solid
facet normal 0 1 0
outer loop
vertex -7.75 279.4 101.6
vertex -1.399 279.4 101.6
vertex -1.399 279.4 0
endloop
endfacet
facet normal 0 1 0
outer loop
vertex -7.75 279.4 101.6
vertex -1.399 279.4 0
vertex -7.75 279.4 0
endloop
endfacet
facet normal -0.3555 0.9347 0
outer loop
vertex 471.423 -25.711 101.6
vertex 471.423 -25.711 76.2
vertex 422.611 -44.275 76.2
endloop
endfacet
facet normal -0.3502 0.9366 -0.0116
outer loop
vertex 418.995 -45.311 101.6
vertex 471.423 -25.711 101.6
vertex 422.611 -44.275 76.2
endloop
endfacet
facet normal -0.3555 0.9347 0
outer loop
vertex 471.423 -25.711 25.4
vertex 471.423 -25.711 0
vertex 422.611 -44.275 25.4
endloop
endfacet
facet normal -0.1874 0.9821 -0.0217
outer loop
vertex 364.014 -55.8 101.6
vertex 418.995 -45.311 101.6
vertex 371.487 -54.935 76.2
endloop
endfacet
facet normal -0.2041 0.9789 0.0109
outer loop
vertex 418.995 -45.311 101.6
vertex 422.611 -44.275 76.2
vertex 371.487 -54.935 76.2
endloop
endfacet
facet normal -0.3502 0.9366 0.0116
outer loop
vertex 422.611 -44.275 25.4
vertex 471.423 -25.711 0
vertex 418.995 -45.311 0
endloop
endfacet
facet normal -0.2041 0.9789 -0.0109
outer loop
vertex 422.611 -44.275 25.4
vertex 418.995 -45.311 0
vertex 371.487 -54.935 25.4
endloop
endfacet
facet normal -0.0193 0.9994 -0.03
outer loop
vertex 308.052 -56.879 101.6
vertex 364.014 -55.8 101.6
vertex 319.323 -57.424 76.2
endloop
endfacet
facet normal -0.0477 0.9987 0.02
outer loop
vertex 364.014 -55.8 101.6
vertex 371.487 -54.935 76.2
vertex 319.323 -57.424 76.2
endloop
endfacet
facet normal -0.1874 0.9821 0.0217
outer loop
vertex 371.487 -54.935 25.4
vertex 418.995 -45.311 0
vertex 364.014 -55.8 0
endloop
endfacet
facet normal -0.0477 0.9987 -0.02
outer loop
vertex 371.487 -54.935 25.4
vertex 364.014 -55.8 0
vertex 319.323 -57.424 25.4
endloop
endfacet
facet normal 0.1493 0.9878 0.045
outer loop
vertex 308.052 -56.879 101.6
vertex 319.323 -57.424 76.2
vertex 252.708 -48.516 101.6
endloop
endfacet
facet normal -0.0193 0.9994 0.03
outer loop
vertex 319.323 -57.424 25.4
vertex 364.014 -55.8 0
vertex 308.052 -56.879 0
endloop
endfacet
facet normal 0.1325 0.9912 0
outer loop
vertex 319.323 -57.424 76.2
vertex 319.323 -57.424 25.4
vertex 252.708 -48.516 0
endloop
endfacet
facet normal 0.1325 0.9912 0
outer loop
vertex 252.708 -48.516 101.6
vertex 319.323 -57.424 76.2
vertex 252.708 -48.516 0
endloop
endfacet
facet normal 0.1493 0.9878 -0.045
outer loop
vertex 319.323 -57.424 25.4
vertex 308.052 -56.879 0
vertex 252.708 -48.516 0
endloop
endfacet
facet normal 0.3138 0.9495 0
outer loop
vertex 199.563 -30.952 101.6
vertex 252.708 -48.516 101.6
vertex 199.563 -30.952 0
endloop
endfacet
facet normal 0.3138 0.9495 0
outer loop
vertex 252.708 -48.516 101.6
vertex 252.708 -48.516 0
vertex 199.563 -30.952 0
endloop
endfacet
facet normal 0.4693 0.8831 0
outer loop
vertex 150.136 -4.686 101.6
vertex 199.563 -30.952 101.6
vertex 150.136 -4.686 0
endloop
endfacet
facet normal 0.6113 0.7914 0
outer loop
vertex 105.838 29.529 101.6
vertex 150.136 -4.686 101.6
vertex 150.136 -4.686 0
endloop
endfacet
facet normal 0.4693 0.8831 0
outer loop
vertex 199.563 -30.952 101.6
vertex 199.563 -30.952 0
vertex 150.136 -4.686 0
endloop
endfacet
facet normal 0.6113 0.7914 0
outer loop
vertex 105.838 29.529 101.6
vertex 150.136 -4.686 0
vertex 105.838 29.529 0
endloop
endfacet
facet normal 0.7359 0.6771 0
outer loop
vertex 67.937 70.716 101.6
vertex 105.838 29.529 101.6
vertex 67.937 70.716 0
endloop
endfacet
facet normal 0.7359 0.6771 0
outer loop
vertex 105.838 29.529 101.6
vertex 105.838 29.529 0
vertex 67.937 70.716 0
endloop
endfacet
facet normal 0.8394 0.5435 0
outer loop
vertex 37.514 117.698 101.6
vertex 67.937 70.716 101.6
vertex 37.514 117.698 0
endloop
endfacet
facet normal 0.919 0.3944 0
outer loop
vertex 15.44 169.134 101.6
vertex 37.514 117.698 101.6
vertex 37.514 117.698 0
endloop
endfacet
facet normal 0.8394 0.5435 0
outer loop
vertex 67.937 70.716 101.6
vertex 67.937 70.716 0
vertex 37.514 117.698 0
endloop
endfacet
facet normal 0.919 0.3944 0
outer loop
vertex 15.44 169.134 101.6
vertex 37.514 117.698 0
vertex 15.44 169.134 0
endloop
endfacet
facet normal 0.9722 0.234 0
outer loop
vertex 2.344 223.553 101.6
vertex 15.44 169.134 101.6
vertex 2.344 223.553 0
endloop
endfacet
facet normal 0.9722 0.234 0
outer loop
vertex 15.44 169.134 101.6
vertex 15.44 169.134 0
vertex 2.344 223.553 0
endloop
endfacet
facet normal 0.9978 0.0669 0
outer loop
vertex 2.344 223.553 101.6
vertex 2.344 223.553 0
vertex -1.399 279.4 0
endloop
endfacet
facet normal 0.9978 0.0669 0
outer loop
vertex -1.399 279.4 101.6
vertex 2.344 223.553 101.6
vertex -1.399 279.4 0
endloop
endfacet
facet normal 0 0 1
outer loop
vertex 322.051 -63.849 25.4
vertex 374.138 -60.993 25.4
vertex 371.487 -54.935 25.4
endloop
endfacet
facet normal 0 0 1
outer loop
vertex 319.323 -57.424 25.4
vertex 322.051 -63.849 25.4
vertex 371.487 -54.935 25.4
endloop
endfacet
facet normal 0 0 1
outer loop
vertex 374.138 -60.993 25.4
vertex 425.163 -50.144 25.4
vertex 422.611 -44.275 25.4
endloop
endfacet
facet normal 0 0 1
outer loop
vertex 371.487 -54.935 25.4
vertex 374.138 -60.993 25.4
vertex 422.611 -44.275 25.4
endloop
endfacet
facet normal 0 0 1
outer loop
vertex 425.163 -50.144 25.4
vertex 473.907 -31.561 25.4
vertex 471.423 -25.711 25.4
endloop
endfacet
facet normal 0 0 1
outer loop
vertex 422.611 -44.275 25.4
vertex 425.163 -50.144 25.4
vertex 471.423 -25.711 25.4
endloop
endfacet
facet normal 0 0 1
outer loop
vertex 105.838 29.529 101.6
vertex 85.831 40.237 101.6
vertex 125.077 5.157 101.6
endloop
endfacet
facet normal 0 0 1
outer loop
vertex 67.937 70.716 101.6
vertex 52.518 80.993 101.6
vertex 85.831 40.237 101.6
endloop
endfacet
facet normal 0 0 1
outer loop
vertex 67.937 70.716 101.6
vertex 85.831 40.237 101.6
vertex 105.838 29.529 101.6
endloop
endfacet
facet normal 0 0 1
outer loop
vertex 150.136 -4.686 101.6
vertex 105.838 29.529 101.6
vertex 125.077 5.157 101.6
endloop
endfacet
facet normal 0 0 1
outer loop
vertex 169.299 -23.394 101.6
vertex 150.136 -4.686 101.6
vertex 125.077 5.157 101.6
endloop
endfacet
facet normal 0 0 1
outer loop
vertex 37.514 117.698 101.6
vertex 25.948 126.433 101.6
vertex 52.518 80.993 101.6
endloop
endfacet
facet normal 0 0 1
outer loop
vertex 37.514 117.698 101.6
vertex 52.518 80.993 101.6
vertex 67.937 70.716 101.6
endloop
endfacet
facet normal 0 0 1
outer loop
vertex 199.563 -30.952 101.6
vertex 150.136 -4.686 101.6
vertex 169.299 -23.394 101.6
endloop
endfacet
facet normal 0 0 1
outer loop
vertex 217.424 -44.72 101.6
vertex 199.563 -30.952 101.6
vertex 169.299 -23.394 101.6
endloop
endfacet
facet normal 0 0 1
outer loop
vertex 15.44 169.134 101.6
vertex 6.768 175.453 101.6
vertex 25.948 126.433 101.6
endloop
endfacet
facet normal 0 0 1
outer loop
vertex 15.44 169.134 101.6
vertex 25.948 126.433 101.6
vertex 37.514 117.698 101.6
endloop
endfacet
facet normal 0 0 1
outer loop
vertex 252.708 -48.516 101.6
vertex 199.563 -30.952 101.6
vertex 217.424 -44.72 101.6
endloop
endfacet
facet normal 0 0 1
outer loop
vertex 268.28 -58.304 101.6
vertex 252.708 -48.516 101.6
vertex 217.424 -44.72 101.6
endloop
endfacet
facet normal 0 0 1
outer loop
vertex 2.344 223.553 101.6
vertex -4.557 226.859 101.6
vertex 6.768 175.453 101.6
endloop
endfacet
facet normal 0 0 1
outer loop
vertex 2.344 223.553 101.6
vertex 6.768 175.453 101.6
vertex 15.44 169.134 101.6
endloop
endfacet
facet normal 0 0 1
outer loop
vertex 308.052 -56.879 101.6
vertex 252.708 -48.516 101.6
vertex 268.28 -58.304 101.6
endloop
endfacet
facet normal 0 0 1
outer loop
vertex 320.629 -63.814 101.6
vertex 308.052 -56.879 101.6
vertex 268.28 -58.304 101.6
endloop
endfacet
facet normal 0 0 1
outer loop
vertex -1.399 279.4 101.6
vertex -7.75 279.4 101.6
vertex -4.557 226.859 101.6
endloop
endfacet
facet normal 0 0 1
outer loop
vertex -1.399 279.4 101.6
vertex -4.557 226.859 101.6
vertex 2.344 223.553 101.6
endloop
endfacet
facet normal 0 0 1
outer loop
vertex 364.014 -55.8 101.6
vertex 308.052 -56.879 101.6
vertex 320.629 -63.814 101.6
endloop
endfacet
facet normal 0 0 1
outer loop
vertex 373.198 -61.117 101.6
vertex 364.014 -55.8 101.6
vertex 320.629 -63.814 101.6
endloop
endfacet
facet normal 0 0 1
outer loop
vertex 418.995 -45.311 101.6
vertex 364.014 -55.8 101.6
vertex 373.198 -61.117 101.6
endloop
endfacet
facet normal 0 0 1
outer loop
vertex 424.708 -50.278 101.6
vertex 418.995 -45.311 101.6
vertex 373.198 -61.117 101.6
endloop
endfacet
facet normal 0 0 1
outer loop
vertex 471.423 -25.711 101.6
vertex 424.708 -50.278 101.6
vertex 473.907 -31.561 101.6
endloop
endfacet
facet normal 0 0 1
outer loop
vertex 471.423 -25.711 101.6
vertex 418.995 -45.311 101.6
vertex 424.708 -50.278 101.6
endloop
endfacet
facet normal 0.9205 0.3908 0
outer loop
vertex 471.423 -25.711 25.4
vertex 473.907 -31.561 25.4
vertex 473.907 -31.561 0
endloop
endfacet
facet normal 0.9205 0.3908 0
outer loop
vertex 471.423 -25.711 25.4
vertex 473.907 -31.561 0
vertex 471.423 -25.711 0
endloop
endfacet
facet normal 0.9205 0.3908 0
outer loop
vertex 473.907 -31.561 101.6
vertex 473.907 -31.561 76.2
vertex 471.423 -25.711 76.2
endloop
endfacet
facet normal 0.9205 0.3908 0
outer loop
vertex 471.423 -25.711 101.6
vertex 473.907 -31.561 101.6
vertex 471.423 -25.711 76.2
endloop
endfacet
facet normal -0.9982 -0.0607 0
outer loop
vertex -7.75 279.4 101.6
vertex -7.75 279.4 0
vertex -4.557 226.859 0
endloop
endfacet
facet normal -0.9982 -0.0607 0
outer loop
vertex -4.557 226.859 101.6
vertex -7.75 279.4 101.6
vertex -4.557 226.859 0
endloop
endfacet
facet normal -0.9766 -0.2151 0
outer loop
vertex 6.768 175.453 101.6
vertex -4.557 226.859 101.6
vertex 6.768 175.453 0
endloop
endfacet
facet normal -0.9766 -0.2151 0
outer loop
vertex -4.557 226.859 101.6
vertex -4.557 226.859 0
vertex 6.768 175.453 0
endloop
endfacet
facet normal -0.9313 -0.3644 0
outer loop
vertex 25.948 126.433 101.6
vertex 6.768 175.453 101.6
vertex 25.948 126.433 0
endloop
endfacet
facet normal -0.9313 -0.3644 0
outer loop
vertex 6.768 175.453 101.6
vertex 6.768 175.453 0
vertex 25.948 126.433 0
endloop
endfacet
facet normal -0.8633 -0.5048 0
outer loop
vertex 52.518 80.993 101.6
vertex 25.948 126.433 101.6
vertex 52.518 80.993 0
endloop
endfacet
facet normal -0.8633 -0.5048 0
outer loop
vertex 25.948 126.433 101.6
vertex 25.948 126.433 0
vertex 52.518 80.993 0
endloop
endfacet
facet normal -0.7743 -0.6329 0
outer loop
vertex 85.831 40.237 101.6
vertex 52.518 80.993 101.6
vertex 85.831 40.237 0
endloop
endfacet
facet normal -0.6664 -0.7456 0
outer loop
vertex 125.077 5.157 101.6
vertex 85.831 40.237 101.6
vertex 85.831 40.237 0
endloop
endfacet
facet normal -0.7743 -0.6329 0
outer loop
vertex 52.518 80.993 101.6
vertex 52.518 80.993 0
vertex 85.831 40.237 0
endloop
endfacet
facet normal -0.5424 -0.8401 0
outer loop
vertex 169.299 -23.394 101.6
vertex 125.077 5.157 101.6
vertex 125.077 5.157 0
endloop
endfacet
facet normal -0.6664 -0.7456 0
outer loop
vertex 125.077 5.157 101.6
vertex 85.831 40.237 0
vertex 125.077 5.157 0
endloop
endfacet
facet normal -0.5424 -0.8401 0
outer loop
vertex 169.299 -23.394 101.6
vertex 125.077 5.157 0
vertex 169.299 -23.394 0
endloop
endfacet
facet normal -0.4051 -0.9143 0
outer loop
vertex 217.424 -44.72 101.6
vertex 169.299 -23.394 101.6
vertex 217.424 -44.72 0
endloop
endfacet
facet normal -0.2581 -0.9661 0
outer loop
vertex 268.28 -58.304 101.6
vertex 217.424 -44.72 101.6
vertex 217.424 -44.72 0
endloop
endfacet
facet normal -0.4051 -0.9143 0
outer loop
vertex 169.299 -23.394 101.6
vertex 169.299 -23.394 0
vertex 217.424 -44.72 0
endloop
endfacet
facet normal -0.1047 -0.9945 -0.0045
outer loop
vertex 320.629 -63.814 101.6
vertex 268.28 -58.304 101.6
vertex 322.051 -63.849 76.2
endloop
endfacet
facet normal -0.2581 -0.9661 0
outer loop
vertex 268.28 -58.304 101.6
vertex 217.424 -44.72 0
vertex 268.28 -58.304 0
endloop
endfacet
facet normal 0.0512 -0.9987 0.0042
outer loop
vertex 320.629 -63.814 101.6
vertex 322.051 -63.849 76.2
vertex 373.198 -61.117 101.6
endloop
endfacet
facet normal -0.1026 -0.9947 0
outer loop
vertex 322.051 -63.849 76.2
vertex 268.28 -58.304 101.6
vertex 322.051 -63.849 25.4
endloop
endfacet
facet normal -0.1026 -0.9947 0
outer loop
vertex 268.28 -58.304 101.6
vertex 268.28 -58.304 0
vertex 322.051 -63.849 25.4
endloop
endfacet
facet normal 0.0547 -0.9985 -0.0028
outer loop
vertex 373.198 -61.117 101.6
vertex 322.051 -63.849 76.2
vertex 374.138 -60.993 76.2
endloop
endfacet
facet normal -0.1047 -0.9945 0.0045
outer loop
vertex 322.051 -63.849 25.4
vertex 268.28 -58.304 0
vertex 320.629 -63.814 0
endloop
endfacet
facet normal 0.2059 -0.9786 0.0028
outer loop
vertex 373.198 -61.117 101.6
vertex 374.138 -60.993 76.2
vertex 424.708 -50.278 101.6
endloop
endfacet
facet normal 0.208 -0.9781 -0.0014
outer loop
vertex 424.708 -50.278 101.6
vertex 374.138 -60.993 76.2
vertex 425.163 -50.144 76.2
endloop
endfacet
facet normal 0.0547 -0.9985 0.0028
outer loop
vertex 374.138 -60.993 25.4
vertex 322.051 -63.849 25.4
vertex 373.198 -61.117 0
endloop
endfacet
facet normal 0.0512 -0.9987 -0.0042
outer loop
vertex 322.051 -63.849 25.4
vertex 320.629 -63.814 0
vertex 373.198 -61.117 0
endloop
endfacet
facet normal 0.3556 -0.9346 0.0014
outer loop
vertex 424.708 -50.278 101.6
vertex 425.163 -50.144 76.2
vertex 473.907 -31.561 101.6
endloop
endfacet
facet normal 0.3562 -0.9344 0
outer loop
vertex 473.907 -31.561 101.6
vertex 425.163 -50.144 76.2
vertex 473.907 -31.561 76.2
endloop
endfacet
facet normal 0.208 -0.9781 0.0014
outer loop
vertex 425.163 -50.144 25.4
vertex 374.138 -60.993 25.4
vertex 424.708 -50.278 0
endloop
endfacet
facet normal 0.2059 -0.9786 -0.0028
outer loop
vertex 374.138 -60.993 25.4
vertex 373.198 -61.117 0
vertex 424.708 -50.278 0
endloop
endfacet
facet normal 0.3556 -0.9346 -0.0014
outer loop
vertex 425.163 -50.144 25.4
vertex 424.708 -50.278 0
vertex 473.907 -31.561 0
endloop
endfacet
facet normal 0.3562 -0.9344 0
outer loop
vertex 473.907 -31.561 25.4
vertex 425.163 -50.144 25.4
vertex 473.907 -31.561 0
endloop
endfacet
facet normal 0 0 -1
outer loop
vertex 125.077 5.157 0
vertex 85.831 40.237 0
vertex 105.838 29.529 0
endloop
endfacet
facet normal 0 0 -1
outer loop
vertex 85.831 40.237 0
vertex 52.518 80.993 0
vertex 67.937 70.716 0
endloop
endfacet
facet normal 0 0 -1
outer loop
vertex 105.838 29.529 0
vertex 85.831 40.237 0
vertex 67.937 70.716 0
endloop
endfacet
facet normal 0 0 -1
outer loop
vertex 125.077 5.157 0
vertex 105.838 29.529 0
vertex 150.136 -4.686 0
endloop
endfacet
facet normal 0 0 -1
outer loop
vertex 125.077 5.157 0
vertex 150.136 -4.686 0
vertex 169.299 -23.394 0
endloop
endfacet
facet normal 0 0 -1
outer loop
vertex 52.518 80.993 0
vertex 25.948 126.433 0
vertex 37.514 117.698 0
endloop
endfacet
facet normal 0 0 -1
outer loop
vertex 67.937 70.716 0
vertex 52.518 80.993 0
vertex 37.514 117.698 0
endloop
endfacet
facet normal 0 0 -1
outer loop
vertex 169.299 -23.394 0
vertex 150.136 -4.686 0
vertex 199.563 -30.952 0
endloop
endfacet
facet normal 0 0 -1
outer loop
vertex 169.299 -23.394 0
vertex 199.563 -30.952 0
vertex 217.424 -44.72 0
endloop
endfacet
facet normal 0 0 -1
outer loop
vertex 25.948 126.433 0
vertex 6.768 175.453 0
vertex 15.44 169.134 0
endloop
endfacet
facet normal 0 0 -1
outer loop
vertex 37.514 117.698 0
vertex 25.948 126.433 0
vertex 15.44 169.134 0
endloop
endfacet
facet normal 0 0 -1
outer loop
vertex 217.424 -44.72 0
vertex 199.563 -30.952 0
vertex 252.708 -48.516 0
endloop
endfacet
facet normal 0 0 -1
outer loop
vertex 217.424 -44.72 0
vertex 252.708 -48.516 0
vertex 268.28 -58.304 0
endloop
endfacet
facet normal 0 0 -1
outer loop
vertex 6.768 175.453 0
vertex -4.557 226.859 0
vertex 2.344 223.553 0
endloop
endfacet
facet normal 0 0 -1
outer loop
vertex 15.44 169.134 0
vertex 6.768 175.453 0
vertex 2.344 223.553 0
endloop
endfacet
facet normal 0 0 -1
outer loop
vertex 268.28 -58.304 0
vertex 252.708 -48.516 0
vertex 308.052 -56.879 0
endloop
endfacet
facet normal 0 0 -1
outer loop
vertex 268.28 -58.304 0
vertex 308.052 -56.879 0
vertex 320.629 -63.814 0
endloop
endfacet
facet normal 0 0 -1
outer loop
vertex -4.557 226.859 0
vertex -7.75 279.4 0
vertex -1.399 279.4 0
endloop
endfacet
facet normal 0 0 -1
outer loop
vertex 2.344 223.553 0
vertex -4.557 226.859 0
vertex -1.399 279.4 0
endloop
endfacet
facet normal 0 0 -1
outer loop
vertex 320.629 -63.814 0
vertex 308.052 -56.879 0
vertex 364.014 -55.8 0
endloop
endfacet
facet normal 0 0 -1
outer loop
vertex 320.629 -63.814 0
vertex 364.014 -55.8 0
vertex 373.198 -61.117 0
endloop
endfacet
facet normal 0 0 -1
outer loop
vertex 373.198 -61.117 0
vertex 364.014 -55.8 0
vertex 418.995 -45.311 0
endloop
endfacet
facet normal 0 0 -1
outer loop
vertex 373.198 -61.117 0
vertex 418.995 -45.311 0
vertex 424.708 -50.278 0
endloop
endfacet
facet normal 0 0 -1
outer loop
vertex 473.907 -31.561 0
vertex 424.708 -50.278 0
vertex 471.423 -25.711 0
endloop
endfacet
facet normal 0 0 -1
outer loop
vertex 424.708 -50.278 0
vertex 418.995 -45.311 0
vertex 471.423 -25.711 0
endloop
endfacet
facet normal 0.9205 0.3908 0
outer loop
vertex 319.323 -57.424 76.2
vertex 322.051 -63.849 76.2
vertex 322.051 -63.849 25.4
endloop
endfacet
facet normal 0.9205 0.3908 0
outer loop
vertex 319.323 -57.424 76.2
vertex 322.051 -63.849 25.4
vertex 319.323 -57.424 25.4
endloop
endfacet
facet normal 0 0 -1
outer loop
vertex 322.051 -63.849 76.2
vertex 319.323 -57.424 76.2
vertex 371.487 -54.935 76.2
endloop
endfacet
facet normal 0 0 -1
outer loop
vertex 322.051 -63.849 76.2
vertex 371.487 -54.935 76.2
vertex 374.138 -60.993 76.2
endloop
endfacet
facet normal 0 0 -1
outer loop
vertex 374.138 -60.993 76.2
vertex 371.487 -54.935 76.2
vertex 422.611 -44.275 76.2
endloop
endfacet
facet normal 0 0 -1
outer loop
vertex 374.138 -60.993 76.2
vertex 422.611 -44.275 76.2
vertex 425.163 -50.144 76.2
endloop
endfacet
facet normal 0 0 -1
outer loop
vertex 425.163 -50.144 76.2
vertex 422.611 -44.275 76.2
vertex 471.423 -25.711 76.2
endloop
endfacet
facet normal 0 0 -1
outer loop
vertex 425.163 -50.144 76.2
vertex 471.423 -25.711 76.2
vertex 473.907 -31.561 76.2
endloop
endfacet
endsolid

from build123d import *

# Parameters (mm, degrees)
F1_DEPTH = 101.6
F3_DEPTH = 152.4
F4_W     = 143.211212
F4_H     = 118.549919
F5_DEPTH = 25.4


with BuildPart() as f1:
    # F0 (on Top) → F1 (new body)
    with BuildSketch(Plane.XY):
        with BuildLine():
            ThreePointArc((471.423321, -25.710636), (139.580084, 2.415757), (0.027949, 304.8))
            Line((0.027949, 304.8), (-6.35, 304.8))
            ThreePointArc((-6.35, 304.8), (136.074708, -2.881746), (473.906585, -31.560616))
            Line((473.906585, -31.560616), (471.423321, -25.710636))
        make_face()
    extrude(amount=F1_DEPTH)

    # F2 (on face) → F3 (cut)
    with BuildSketch(Plane(origin=(390.198528, 165.635729, 0), x_dir=(-0.390744, 0.9205, 0), z_dir=(0.9205, 0.390744, 0))):
        Polygon((-139.049853, 76.2), (-316.849853, 76.2), (-316.849853, 25.4), (-214.227537, 25.4), (-139.049853, 25.4), align=None)
    extrude(amount=-F3_DEPTH, mode=Mode.SUBTRACT)

    # F4 (on face) → F5 (cut)
    with BuildSketch(Plane(origin=(0, 304.8, 0), x_dir=(-1, 0, 0), z_dir=(0, 1, 0))):
        with Locations((-15.944215, 54.147762)):
            Rectangle(F4_W, F4_H)
    extrude(amount=-F5_DEPTH, mode=Mode.SUBTRACT)


solid = f1.part
